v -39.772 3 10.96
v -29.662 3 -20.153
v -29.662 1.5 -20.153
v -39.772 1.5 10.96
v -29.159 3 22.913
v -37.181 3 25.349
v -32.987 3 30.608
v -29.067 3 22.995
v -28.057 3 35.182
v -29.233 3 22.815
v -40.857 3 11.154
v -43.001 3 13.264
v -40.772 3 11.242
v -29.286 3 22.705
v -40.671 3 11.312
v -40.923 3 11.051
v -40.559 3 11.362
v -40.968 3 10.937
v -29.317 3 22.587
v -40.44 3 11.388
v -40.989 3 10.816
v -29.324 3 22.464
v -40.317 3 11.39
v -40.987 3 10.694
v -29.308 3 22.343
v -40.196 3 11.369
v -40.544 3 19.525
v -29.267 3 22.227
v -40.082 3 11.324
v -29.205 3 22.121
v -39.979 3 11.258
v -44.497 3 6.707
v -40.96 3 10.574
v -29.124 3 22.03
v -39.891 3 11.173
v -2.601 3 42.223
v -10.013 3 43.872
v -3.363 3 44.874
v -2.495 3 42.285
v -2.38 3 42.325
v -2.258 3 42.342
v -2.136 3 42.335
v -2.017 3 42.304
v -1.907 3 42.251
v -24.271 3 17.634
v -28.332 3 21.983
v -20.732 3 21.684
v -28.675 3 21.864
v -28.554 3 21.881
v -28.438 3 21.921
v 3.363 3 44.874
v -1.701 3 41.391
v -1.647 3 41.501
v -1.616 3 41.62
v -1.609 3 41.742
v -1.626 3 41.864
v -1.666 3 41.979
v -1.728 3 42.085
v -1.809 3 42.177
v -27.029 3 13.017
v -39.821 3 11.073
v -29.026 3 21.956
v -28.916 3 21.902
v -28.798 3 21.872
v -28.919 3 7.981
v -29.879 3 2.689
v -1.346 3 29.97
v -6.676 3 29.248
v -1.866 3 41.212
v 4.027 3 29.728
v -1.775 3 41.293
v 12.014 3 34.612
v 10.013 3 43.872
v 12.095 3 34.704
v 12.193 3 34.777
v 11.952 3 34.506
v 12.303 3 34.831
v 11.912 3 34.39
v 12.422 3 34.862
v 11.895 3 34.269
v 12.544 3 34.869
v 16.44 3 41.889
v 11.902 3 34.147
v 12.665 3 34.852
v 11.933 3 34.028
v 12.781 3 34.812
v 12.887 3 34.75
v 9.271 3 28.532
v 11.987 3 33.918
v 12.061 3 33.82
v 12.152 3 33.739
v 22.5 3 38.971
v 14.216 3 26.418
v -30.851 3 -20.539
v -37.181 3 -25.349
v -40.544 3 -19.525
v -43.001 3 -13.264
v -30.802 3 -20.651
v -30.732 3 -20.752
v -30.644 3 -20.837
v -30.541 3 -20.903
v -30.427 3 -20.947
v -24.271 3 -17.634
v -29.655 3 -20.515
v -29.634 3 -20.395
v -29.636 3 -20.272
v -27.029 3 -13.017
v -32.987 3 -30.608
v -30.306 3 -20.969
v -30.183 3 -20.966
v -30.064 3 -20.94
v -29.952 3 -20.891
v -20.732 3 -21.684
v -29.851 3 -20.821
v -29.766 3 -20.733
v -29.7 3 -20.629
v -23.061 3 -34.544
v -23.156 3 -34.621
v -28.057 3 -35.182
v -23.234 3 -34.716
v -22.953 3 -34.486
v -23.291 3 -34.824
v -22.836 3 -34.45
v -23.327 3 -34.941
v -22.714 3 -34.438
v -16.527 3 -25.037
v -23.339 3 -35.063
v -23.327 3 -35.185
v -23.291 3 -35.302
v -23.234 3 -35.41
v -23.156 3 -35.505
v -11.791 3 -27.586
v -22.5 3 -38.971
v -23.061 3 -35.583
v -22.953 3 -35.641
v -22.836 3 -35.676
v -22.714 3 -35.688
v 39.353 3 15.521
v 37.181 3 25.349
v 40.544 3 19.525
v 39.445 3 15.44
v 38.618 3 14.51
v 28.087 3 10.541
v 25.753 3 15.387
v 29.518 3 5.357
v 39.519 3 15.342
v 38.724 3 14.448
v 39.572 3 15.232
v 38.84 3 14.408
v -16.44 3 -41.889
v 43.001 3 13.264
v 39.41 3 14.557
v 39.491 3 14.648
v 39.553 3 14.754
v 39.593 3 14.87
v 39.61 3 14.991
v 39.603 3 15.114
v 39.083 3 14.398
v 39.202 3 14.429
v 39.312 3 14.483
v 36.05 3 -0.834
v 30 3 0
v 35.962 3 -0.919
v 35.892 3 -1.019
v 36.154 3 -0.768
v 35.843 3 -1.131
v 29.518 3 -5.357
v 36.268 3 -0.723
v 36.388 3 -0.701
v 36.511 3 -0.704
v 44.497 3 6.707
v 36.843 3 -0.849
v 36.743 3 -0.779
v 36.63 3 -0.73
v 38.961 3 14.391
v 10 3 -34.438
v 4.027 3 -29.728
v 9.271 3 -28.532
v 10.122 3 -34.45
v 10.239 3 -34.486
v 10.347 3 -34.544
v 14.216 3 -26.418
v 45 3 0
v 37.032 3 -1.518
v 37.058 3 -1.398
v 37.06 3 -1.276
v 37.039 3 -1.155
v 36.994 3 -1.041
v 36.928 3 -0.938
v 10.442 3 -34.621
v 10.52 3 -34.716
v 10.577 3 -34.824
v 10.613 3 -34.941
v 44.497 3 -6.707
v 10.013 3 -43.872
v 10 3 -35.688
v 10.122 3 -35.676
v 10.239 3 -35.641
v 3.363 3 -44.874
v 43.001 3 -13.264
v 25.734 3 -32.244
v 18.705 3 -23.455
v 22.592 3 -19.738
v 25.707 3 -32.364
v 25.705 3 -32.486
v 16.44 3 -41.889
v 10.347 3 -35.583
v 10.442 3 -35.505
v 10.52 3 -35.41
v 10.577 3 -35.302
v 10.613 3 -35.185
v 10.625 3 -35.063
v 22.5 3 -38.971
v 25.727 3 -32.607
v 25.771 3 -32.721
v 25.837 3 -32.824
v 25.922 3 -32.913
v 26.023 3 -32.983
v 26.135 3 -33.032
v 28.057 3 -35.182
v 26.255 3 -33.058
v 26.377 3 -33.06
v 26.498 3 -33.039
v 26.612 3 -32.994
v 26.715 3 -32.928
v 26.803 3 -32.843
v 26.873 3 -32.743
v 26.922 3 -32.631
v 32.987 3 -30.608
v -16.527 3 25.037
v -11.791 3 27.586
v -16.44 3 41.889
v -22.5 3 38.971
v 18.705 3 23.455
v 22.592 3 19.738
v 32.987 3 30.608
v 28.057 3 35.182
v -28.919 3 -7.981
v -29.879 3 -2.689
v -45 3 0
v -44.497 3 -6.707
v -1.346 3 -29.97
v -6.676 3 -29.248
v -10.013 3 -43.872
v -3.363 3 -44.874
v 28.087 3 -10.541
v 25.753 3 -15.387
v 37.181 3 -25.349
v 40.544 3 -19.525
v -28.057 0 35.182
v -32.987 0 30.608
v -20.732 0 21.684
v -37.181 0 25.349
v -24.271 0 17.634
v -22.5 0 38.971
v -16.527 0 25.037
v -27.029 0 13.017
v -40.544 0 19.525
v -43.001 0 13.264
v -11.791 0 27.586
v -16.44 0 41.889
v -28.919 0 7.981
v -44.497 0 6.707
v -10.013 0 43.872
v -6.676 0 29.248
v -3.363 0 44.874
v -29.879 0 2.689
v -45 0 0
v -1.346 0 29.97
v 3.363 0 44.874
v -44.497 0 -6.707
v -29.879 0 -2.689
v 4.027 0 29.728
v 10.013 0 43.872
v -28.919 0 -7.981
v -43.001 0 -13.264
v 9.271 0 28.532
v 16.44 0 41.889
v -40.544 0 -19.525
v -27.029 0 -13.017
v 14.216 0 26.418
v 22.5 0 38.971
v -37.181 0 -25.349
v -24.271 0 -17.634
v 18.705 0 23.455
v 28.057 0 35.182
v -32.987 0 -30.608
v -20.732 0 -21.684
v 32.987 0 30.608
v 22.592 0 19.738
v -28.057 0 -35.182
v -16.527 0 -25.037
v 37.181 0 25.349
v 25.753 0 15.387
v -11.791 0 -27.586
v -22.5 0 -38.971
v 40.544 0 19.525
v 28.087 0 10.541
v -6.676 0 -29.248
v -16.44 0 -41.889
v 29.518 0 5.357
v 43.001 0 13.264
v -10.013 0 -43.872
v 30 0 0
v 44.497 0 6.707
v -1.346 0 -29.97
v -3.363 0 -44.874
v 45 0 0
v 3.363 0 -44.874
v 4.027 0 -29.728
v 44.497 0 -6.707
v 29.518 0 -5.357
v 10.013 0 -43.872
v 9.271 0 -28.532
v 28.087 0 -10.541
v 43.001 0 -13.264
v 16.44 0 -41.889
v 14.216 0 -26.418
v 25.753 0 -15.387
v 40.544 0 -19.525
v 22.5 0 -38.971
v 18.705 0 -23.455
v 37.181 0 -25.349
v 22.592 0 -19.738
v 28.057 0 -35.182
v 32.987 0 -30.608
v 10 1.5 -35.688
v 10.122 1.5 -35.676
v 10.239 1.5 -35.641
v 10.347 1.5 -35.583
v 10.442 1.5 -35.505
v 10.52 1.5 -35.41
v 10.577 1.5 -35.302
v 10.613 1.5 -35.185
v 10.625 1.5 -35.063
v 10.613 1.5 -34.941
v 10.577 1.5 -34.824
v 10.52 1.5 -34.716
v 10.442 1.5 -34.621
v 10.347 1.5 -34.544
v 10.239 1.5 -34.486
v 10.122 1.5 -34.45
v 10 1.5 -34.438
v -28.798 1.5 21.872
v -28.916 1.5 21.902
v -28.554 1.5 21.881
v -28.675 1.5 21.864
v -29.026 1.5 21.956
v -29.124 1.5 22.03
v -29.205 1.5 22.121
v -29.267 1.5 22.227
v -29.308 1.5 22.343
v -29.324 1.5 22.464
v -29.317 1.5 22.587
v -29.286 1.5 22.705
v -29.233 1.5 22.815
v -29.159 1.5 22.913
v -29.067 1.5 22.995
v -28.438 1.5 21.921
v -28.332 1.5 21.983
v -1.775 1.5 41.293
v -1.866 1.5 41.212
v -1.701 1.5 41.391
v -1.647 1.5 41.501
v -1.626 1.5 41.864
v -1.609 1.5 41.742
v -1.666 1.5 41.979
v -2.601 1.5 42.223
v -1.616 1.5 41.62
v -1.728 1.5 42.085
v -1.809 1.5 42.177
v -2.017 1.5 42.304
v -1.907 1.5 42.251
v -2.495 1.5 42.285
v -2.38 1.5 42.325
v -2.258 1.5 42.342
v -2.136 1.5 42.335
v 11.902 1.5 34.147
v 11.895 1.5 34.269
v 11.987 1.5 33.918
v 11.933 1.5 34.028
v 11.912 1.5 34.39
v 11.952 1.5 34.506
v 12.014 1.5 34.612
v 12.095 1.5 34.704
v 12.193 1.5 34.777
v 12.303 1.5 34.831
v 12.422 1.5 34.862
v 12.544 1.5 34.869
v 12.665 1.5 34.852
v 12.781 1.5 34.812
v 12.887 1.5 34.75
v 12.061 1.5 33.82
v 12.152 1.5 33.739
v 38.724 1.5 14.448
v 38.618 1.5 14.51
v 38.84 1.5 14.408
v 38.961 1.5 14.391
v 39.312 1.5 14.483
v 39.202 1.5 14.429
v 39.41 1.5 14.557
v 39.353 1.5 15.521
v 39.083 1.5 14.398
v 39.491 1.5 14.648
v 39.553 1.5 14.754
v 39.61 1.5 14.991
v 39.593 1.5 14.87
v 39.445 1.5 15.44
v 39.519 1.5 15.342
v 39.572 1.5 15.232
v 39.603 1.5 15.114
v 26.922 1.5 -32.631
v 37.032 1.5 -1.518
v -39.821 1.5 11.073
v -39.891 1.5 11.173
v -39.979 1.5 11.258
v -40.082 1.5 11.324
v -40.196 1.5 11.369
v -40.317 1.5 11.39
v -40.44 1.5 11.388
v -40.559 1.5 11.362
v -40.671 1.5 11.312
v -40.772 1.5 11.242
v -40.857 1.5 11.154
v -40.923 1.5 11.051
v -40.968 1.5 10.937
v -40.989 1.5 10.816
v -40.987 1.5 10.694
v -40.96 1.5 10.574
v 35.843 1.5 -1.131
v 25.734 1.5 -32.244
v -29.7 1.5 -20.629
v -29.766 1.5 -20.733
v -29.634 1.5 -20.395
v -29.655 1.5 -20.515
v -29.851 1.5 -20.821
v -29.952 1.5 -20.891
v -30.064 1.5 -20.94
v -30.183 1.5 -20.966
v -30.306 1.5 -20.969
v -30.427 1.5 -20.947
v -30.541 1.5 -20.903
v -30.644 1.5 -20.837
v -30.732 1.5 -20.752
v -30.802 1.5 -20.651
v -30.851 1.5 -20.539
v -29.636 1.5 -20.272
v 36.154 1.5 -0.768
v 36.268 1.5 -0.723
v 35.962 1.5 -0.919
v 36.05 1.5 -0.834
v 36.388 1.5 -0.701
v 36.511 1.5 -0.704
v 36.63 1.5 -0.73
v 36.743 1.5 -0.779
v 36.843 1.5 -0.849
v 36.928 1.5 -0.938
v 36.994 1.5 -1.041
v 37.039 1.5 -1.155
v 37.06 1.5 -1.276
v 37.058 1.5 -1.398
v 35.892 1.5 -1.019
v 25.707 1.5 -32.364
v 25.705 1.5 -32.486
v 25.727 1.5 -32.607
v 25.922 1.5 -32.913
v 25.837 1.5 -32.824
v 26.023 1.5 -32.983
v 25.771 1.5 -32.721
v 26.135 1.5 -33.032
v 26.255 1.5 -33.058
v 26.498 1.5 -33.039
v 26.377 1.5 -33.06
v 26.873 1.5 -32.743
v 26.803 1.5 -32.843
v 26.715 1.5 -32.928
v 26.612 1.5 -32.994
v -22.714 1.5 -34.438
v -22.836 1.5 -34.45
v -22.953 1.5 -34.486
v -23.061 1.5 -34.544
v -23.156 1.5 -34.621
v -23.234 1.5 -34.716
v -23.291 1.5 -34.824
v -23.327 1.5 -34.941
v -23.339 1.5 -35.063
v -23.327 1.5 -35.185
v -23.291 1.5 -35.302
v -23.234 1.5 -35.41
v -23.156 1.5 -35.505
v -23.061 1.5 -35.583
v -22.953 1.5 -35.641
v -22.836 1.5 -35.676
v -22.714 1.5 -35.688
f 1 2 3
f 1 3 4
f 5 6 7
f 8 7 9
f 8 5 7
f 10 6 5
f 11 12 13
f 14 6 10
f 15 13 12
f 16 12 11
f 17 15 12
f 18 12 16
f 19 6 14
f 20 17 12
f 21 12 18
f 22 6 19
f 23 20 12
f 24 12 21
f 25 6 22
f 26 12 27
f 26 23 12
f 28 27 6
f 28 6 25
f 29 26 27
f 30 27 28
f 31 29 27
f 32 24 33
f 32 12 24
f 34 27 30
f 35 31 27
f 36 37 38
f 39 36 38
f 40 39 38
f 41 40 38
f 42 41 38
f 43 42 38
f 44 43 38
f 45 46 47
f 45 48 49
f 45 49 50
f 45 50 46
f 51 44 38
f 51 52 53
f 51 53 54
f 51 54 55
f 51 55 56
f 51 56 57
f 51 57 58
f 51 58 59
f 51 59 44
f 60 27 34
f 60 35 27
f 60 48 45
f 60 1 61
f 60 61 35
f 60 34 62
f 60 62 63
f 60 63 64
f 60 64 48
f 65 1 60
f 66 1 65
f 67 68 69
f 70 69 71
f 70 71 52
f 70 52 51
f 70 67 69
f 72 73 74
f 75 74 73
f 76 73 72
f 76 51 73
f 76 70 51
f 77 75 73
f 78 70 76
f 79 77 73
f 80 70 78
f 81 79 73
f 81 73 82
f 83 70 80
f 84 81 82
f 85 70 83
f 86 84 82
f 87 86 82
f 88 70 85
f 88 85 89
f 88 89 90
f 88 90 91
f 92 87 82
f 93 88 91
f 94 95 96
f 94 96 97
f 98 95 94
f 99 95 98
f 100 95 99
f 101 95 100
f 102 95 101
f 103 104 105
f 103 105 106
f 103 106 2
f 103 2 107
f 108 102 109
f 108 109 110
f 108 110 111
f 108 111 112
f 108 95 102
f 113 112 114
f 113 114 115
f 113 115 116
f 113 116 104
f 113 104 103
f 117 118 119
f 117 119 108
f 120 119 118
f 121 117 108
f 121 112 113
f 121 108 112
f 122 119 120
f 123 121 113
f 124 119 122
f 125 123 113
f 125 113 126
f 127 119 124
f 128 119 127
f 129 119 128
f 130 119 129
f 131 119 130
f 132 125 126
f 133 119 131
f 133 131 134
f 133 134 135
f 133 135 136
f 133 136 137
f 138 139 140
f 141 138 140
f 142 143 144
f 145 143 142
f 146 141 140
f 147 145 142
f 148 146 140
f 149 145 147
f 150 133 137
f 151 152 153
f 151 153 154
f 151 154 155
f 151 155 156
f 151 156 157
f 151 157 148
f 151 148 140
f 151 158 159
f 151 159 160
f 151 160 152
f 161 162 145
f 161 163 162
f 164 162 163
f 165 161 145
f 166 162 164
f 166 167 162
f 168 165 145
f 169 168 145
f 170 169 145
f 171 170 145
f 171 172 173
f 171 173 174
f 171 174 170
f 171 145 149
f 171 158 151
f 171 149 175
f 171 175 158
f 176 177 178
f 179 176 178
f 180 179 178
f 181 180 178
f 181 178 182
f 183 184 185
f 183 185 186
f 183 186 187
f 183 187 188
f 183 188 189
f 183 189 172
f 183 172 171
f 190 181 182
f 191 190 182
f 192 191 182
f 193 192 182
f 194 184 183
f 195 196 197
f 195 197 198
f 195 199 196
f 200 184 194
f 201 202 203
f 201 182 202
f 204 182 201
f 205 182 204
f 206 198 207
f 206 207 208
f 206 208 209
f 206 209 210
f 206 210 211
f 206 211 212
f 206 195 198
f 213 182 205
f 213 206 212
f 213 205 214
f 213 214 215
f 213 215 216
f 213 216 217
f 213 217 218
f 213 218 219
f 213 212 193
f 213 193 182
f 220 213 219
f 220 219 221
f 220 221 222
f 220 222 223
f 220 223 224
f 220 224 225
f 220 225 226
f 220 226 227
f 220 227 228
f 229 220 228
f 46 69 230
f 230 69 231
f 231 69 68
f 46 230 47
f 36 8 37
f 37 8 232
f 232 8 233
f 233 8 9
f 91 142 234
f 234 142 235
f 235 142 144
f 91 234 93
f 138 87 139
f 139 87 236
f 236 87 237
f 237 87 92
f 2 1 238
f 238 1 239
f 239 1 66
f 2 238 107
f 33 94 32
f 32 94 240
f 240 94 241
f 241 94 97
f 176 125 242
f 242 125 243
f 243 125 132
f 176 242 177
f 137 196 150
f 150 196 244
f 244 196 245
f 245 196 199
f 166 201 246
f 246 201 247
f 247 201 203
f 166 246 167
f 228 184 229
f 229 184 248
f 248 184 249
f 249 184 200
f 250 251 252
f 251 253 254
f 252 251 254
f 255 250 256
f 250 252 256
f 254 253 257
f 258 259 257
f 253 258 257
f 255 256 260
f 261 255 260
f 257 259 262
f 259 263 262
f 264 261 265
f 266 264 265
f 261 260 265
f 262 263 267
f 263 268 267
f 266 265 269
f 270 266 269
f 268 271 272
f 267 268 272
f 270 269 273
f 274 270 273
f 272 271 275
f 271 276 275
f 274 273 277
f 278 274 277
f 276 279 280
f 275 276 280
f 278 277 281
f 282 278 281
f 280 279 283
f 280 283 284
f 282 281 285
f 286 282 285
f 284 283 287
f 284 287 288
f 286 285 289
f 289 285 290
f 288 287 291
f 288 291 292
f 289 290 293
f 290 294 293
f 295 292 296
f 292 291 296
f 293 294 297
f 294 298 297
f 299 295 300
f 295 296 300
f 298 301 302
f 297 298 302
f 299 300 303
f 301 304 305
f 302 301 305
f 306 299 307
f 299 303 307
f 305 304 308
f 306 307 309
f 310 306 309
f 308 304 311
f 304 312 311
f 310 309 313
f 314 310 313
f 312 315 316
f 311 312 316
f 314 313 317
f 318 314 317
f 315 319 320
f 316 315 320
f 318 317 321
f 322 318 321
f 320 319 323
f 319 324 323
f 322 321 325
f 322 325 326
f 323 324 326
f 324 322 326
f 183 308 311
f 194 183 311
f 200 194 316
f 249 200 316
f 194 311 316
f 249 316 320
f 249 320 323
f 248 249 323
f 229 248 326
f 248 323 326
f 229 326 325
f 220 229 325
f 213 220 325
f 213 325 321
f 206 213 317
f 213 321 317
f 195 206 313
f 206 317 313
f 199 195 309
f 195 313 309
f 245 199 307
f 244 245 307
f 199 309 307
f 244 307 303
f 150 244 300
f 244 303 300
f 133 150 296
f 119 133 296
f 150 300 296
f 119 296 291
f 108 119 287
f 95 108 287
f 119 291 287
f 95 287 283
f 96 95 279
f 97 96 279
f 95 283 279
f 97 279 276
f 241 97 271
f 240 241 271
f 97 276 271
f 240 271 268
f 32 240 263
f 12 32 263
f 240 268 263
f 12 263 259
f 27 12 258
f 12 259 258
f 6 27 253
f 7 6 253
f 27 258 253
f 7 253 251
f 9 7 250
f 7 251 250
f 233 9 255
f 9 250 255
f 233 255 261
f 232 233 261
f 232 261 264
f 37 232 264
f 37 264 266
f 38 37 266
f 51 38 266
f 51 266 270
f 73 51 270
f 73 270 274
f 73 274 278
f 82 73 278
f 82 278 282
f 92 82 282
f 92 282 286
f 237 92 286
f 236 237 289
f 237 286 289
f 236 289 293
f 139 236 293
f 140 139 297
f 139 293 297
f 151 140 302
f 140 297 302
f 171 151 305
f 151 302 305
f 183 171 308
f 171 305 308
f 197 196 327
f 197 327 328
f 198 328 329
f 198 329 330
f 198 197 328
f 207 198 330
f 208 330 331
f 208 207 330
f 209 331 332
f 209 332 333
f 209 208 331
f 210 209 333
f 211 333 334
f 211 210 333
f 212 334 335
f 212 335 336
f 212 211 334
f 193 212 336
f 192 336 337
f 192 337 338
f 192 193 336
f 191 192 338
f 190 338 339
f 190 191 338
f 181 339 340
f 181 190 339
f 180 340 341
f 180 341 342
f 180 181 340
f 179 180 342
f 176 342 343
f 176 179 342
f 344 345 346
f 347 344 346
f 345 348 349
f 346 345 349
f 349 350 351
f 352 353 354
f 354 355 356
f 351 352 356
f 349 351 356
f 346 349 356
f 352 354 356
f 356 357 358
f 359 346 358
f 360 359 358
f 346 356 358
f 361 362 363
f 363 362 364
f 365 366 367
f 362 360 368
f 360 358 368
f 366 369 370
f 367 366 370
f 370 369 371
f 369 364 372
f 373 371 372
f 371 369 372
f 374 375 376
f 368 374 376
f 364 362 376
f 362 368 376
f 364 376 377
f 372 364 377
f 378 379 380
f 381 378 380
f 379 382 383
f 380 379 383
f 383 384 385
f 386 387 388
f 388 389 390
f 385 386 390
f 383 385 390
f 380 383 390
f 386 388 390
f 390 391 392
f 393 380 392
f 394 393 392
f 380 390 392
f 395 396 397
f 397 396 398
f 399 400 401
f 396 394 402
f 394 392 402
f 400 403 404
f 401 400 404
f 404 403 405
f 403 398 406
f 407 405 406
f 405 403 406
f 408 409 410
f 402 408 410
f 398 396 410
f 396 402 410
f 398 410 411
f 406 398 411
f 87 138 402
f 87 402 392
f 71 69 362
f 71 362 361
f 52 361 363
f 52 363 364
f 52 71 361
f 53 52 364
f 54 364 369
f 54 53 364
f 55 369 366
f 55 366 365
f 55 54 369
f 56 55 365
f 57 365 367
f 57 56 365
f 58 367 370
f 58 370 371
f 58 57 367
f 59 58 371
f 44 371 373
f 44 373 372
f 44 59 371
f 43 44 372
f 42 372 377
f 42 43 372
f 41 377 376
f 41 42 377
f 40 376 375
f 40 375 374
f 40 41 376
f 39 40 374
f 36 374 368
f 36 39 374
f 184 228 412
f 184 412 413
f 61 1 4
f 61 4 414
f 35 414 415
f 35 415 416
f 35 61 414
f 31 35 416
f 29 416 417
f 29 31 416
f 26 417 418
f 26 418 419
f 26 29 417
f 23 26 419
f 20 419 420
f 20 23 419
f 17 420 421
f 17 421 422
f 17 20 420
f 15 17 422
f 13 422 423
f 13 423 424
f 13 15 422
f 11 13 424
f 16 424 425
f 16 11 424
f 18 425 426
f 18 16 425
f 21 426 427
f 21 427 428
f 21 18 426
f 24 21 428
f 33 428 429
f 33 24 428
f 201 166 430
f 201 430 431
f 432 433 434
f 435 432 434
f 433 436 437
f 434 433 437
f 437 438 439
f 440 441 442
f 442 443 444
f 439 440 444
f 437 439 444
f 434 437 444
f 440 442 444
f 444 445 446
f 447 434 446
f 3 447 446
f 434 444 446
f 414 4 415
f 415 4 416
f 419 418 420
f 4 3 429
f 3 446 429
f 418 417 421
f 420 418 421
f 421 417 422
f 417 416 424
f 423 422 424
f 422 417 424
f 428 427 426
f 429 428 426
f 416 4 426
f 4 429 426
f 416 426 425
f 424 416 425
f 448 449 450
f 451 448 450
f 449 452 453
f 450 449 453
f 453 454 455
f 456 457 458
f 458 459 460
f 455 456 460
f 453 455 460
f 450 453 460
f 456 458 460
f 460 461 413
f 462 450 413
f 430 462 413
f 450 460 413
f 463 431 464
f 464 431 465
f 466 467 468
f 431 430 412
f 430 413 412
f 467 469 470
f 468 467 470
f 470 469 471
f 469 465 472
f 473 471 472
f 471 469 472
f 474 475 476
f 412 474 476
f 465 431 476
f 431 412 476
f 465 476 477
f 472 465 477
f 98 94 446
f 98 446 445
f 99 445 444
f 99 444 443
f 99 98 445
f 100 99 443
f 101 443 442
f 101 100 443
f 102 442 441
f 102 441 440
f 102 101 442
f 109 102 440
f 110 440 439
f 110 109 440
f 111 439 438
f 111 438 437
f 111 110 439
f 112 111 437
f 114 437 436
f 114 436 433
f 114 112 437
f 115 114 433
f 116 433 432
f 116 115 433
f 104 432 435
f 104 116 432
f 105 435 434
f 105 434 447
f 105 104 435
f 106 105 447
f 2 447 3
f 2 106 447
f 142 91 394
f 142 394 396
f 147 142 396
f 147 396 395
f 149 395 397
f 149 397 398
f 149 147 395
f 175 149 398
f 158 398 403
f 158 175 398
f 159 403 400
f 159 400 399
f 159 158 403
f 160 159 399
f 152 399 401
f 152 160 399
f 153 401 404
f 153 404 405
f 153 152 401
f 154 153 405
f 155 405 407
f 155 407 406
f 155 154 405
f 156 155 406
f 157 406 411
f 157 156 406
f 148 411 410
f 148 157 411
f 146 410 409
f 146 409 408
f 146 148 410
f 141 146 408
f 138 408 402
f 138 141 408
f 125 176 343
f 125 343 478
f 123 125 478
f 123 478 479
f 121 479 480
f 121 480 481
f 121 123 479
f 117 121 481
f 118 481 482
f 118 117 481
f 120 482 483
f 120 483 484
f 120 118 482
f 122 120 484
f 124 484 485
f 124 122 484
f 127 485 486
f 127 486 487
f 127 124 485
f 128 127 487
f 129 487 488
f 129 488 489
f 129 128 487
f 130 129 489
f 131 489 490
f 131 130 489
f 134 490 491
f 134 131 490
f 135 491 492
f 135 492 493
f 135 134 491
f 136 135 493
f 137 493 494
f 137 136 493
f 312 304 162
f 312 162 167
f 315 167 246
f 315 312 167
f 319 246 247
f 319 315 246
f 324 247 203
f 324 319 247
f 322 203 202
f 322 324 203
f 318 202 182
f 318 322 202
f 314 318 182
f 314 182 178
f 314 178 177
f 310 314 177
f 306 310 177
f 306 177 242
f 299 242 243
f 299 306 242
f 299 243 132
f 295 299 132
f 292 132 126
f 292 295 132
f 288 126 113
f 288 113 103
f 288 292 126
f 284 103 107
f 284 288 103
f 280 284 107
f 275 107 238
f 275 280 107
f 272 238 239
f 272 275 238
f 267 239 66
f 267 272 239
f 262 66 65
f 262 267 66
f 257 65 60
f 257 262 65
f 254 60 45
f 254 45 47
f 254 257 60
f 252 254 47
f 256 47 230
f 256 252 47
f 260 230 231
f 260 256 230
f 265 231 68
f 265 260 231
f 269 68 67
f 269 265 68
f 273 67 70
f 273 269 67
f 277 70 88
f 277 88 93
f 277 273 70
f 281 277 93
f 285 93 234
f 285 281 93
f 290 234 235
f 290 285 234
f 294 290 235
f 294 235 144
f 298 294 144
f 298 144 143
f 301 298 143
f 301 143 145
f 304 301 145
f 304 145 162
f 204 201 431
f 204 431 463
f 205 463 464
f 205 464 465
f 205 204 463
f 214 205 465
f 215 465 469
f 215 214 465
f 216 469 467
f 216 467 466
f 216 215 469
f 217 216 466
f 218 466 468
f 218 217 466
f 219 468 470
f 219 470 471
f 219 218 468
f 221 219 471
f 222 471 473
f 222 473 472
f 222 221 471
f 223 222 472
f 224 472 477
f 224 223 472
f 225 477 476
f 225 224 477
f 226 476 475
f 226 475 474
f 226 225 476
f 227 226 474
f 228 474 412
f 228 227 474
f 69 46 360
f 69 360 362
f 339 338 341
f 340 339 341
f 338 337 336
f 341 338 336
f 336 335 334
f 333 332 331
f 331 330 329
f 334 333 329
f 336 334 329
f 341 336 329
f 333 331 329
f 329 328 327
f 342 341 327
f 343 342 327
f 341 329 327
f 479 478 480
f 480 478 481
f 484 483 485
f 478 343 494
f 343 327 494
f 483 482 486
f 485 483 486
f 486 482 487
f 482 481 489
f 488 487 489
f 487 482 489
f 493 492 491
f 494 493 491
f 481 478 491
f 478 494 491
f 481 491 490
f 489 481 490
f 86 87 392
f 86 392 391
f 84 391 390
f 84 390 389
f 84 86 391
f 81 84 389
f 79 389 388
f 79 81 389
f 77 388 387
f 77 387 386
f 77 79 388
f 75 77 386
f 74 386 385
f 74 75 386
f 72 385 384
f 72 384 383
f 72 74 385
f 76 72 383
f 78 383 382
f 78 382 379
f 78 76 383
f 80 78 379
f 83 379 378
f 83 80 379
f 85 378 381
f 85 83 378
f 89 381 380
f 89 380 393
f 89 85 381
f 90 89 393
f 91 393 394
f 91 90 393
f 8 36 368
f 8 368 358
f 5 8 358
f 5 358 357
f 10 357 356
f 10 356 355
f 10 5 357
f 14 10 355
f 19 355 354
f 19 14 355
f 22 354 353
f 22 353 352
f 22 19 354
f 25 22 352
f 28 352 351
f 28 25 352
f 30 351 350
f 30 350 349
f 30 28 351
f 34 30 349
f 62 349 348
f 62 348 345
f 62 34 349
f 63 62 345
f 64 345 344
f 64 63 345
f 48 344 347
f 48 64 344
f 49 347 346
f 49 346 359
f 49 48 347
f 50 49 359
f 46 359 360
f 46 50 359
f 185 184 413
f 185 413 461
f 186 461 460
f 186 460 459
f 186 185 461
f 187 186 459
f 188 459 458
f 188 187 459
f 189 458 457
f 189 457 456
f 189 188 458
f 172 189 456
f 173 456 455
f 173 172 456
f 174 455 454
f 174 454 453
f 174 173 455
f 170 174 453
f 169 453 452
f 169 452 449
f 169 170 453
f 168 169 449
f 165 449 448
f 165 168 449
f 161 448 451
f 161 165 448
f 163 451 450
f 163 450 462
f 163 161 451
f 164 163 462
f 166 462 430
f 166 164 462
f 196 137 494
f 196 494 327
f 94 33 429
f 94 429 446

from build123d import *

# Parameters (mm, degrees)
SKETCH1_R           = 45
SKETCH1_R_2         = 30
BOSS_EXTRUDE1_DEPTH = 3
CUT_EXTRUDE1_DEPTH  = 1.5
CIRPATTERN1_COUNT   = 5


with BuildPart() as part:
    # Sketch1 → Boss-Extrude1 (new body)
    with BuildSketch(Plane(origin=(0, 0, 0), x_dir=(1, 0, 0), z_dir=(0, 1, 0))):
        Circle(SKETCH1_R)
        Circle(SKETCH1_R_2, mode=Mode.SUBTRACT)
    extrude(amount=BOSS_EXTRUDE1_DEPTH)

    # Sketch2 → Cut-Extrude1 (cut)
    with BuildSketch(Plane(origin=(0, 3, 0), x_dir=(1, 0, 0), z_dir=(0, 1, 0))):
        with BuildLine():
            Line((10, 34.438191534), (-22.713965574, 34.438191534))
            ThreePointArc((-22.713965574, 34.438191534), (-23.338965574, 35.063191534), (-22.713965574, 35.688191534))
            Line((-22.713965574, 35.688191534), (10, 35.688191534))
            ThreePointArc((10, 35.688191534), (10.625, 35.063191534), (10, 34.438191534))
        make_face()
    cut_extrude1 = extrude(amount=-CUT_EXTRUDE1_DEPTH, mode=Mode.SUBTRACT)

    # CirPattern1: Cut-Extrude1 ×5 about axis
    cirpattern1_axis = Axis((0, 0, 0), (0, 1, 0))
    for i in range(1, CIRPATTERN1_COUNT):
        add(cut_extrude1.rotate(cirpattern1_axis, i * 360 / CIRPATTERN1_COUNT), mode=Mode.SUBTRACT)


solid = part.part
